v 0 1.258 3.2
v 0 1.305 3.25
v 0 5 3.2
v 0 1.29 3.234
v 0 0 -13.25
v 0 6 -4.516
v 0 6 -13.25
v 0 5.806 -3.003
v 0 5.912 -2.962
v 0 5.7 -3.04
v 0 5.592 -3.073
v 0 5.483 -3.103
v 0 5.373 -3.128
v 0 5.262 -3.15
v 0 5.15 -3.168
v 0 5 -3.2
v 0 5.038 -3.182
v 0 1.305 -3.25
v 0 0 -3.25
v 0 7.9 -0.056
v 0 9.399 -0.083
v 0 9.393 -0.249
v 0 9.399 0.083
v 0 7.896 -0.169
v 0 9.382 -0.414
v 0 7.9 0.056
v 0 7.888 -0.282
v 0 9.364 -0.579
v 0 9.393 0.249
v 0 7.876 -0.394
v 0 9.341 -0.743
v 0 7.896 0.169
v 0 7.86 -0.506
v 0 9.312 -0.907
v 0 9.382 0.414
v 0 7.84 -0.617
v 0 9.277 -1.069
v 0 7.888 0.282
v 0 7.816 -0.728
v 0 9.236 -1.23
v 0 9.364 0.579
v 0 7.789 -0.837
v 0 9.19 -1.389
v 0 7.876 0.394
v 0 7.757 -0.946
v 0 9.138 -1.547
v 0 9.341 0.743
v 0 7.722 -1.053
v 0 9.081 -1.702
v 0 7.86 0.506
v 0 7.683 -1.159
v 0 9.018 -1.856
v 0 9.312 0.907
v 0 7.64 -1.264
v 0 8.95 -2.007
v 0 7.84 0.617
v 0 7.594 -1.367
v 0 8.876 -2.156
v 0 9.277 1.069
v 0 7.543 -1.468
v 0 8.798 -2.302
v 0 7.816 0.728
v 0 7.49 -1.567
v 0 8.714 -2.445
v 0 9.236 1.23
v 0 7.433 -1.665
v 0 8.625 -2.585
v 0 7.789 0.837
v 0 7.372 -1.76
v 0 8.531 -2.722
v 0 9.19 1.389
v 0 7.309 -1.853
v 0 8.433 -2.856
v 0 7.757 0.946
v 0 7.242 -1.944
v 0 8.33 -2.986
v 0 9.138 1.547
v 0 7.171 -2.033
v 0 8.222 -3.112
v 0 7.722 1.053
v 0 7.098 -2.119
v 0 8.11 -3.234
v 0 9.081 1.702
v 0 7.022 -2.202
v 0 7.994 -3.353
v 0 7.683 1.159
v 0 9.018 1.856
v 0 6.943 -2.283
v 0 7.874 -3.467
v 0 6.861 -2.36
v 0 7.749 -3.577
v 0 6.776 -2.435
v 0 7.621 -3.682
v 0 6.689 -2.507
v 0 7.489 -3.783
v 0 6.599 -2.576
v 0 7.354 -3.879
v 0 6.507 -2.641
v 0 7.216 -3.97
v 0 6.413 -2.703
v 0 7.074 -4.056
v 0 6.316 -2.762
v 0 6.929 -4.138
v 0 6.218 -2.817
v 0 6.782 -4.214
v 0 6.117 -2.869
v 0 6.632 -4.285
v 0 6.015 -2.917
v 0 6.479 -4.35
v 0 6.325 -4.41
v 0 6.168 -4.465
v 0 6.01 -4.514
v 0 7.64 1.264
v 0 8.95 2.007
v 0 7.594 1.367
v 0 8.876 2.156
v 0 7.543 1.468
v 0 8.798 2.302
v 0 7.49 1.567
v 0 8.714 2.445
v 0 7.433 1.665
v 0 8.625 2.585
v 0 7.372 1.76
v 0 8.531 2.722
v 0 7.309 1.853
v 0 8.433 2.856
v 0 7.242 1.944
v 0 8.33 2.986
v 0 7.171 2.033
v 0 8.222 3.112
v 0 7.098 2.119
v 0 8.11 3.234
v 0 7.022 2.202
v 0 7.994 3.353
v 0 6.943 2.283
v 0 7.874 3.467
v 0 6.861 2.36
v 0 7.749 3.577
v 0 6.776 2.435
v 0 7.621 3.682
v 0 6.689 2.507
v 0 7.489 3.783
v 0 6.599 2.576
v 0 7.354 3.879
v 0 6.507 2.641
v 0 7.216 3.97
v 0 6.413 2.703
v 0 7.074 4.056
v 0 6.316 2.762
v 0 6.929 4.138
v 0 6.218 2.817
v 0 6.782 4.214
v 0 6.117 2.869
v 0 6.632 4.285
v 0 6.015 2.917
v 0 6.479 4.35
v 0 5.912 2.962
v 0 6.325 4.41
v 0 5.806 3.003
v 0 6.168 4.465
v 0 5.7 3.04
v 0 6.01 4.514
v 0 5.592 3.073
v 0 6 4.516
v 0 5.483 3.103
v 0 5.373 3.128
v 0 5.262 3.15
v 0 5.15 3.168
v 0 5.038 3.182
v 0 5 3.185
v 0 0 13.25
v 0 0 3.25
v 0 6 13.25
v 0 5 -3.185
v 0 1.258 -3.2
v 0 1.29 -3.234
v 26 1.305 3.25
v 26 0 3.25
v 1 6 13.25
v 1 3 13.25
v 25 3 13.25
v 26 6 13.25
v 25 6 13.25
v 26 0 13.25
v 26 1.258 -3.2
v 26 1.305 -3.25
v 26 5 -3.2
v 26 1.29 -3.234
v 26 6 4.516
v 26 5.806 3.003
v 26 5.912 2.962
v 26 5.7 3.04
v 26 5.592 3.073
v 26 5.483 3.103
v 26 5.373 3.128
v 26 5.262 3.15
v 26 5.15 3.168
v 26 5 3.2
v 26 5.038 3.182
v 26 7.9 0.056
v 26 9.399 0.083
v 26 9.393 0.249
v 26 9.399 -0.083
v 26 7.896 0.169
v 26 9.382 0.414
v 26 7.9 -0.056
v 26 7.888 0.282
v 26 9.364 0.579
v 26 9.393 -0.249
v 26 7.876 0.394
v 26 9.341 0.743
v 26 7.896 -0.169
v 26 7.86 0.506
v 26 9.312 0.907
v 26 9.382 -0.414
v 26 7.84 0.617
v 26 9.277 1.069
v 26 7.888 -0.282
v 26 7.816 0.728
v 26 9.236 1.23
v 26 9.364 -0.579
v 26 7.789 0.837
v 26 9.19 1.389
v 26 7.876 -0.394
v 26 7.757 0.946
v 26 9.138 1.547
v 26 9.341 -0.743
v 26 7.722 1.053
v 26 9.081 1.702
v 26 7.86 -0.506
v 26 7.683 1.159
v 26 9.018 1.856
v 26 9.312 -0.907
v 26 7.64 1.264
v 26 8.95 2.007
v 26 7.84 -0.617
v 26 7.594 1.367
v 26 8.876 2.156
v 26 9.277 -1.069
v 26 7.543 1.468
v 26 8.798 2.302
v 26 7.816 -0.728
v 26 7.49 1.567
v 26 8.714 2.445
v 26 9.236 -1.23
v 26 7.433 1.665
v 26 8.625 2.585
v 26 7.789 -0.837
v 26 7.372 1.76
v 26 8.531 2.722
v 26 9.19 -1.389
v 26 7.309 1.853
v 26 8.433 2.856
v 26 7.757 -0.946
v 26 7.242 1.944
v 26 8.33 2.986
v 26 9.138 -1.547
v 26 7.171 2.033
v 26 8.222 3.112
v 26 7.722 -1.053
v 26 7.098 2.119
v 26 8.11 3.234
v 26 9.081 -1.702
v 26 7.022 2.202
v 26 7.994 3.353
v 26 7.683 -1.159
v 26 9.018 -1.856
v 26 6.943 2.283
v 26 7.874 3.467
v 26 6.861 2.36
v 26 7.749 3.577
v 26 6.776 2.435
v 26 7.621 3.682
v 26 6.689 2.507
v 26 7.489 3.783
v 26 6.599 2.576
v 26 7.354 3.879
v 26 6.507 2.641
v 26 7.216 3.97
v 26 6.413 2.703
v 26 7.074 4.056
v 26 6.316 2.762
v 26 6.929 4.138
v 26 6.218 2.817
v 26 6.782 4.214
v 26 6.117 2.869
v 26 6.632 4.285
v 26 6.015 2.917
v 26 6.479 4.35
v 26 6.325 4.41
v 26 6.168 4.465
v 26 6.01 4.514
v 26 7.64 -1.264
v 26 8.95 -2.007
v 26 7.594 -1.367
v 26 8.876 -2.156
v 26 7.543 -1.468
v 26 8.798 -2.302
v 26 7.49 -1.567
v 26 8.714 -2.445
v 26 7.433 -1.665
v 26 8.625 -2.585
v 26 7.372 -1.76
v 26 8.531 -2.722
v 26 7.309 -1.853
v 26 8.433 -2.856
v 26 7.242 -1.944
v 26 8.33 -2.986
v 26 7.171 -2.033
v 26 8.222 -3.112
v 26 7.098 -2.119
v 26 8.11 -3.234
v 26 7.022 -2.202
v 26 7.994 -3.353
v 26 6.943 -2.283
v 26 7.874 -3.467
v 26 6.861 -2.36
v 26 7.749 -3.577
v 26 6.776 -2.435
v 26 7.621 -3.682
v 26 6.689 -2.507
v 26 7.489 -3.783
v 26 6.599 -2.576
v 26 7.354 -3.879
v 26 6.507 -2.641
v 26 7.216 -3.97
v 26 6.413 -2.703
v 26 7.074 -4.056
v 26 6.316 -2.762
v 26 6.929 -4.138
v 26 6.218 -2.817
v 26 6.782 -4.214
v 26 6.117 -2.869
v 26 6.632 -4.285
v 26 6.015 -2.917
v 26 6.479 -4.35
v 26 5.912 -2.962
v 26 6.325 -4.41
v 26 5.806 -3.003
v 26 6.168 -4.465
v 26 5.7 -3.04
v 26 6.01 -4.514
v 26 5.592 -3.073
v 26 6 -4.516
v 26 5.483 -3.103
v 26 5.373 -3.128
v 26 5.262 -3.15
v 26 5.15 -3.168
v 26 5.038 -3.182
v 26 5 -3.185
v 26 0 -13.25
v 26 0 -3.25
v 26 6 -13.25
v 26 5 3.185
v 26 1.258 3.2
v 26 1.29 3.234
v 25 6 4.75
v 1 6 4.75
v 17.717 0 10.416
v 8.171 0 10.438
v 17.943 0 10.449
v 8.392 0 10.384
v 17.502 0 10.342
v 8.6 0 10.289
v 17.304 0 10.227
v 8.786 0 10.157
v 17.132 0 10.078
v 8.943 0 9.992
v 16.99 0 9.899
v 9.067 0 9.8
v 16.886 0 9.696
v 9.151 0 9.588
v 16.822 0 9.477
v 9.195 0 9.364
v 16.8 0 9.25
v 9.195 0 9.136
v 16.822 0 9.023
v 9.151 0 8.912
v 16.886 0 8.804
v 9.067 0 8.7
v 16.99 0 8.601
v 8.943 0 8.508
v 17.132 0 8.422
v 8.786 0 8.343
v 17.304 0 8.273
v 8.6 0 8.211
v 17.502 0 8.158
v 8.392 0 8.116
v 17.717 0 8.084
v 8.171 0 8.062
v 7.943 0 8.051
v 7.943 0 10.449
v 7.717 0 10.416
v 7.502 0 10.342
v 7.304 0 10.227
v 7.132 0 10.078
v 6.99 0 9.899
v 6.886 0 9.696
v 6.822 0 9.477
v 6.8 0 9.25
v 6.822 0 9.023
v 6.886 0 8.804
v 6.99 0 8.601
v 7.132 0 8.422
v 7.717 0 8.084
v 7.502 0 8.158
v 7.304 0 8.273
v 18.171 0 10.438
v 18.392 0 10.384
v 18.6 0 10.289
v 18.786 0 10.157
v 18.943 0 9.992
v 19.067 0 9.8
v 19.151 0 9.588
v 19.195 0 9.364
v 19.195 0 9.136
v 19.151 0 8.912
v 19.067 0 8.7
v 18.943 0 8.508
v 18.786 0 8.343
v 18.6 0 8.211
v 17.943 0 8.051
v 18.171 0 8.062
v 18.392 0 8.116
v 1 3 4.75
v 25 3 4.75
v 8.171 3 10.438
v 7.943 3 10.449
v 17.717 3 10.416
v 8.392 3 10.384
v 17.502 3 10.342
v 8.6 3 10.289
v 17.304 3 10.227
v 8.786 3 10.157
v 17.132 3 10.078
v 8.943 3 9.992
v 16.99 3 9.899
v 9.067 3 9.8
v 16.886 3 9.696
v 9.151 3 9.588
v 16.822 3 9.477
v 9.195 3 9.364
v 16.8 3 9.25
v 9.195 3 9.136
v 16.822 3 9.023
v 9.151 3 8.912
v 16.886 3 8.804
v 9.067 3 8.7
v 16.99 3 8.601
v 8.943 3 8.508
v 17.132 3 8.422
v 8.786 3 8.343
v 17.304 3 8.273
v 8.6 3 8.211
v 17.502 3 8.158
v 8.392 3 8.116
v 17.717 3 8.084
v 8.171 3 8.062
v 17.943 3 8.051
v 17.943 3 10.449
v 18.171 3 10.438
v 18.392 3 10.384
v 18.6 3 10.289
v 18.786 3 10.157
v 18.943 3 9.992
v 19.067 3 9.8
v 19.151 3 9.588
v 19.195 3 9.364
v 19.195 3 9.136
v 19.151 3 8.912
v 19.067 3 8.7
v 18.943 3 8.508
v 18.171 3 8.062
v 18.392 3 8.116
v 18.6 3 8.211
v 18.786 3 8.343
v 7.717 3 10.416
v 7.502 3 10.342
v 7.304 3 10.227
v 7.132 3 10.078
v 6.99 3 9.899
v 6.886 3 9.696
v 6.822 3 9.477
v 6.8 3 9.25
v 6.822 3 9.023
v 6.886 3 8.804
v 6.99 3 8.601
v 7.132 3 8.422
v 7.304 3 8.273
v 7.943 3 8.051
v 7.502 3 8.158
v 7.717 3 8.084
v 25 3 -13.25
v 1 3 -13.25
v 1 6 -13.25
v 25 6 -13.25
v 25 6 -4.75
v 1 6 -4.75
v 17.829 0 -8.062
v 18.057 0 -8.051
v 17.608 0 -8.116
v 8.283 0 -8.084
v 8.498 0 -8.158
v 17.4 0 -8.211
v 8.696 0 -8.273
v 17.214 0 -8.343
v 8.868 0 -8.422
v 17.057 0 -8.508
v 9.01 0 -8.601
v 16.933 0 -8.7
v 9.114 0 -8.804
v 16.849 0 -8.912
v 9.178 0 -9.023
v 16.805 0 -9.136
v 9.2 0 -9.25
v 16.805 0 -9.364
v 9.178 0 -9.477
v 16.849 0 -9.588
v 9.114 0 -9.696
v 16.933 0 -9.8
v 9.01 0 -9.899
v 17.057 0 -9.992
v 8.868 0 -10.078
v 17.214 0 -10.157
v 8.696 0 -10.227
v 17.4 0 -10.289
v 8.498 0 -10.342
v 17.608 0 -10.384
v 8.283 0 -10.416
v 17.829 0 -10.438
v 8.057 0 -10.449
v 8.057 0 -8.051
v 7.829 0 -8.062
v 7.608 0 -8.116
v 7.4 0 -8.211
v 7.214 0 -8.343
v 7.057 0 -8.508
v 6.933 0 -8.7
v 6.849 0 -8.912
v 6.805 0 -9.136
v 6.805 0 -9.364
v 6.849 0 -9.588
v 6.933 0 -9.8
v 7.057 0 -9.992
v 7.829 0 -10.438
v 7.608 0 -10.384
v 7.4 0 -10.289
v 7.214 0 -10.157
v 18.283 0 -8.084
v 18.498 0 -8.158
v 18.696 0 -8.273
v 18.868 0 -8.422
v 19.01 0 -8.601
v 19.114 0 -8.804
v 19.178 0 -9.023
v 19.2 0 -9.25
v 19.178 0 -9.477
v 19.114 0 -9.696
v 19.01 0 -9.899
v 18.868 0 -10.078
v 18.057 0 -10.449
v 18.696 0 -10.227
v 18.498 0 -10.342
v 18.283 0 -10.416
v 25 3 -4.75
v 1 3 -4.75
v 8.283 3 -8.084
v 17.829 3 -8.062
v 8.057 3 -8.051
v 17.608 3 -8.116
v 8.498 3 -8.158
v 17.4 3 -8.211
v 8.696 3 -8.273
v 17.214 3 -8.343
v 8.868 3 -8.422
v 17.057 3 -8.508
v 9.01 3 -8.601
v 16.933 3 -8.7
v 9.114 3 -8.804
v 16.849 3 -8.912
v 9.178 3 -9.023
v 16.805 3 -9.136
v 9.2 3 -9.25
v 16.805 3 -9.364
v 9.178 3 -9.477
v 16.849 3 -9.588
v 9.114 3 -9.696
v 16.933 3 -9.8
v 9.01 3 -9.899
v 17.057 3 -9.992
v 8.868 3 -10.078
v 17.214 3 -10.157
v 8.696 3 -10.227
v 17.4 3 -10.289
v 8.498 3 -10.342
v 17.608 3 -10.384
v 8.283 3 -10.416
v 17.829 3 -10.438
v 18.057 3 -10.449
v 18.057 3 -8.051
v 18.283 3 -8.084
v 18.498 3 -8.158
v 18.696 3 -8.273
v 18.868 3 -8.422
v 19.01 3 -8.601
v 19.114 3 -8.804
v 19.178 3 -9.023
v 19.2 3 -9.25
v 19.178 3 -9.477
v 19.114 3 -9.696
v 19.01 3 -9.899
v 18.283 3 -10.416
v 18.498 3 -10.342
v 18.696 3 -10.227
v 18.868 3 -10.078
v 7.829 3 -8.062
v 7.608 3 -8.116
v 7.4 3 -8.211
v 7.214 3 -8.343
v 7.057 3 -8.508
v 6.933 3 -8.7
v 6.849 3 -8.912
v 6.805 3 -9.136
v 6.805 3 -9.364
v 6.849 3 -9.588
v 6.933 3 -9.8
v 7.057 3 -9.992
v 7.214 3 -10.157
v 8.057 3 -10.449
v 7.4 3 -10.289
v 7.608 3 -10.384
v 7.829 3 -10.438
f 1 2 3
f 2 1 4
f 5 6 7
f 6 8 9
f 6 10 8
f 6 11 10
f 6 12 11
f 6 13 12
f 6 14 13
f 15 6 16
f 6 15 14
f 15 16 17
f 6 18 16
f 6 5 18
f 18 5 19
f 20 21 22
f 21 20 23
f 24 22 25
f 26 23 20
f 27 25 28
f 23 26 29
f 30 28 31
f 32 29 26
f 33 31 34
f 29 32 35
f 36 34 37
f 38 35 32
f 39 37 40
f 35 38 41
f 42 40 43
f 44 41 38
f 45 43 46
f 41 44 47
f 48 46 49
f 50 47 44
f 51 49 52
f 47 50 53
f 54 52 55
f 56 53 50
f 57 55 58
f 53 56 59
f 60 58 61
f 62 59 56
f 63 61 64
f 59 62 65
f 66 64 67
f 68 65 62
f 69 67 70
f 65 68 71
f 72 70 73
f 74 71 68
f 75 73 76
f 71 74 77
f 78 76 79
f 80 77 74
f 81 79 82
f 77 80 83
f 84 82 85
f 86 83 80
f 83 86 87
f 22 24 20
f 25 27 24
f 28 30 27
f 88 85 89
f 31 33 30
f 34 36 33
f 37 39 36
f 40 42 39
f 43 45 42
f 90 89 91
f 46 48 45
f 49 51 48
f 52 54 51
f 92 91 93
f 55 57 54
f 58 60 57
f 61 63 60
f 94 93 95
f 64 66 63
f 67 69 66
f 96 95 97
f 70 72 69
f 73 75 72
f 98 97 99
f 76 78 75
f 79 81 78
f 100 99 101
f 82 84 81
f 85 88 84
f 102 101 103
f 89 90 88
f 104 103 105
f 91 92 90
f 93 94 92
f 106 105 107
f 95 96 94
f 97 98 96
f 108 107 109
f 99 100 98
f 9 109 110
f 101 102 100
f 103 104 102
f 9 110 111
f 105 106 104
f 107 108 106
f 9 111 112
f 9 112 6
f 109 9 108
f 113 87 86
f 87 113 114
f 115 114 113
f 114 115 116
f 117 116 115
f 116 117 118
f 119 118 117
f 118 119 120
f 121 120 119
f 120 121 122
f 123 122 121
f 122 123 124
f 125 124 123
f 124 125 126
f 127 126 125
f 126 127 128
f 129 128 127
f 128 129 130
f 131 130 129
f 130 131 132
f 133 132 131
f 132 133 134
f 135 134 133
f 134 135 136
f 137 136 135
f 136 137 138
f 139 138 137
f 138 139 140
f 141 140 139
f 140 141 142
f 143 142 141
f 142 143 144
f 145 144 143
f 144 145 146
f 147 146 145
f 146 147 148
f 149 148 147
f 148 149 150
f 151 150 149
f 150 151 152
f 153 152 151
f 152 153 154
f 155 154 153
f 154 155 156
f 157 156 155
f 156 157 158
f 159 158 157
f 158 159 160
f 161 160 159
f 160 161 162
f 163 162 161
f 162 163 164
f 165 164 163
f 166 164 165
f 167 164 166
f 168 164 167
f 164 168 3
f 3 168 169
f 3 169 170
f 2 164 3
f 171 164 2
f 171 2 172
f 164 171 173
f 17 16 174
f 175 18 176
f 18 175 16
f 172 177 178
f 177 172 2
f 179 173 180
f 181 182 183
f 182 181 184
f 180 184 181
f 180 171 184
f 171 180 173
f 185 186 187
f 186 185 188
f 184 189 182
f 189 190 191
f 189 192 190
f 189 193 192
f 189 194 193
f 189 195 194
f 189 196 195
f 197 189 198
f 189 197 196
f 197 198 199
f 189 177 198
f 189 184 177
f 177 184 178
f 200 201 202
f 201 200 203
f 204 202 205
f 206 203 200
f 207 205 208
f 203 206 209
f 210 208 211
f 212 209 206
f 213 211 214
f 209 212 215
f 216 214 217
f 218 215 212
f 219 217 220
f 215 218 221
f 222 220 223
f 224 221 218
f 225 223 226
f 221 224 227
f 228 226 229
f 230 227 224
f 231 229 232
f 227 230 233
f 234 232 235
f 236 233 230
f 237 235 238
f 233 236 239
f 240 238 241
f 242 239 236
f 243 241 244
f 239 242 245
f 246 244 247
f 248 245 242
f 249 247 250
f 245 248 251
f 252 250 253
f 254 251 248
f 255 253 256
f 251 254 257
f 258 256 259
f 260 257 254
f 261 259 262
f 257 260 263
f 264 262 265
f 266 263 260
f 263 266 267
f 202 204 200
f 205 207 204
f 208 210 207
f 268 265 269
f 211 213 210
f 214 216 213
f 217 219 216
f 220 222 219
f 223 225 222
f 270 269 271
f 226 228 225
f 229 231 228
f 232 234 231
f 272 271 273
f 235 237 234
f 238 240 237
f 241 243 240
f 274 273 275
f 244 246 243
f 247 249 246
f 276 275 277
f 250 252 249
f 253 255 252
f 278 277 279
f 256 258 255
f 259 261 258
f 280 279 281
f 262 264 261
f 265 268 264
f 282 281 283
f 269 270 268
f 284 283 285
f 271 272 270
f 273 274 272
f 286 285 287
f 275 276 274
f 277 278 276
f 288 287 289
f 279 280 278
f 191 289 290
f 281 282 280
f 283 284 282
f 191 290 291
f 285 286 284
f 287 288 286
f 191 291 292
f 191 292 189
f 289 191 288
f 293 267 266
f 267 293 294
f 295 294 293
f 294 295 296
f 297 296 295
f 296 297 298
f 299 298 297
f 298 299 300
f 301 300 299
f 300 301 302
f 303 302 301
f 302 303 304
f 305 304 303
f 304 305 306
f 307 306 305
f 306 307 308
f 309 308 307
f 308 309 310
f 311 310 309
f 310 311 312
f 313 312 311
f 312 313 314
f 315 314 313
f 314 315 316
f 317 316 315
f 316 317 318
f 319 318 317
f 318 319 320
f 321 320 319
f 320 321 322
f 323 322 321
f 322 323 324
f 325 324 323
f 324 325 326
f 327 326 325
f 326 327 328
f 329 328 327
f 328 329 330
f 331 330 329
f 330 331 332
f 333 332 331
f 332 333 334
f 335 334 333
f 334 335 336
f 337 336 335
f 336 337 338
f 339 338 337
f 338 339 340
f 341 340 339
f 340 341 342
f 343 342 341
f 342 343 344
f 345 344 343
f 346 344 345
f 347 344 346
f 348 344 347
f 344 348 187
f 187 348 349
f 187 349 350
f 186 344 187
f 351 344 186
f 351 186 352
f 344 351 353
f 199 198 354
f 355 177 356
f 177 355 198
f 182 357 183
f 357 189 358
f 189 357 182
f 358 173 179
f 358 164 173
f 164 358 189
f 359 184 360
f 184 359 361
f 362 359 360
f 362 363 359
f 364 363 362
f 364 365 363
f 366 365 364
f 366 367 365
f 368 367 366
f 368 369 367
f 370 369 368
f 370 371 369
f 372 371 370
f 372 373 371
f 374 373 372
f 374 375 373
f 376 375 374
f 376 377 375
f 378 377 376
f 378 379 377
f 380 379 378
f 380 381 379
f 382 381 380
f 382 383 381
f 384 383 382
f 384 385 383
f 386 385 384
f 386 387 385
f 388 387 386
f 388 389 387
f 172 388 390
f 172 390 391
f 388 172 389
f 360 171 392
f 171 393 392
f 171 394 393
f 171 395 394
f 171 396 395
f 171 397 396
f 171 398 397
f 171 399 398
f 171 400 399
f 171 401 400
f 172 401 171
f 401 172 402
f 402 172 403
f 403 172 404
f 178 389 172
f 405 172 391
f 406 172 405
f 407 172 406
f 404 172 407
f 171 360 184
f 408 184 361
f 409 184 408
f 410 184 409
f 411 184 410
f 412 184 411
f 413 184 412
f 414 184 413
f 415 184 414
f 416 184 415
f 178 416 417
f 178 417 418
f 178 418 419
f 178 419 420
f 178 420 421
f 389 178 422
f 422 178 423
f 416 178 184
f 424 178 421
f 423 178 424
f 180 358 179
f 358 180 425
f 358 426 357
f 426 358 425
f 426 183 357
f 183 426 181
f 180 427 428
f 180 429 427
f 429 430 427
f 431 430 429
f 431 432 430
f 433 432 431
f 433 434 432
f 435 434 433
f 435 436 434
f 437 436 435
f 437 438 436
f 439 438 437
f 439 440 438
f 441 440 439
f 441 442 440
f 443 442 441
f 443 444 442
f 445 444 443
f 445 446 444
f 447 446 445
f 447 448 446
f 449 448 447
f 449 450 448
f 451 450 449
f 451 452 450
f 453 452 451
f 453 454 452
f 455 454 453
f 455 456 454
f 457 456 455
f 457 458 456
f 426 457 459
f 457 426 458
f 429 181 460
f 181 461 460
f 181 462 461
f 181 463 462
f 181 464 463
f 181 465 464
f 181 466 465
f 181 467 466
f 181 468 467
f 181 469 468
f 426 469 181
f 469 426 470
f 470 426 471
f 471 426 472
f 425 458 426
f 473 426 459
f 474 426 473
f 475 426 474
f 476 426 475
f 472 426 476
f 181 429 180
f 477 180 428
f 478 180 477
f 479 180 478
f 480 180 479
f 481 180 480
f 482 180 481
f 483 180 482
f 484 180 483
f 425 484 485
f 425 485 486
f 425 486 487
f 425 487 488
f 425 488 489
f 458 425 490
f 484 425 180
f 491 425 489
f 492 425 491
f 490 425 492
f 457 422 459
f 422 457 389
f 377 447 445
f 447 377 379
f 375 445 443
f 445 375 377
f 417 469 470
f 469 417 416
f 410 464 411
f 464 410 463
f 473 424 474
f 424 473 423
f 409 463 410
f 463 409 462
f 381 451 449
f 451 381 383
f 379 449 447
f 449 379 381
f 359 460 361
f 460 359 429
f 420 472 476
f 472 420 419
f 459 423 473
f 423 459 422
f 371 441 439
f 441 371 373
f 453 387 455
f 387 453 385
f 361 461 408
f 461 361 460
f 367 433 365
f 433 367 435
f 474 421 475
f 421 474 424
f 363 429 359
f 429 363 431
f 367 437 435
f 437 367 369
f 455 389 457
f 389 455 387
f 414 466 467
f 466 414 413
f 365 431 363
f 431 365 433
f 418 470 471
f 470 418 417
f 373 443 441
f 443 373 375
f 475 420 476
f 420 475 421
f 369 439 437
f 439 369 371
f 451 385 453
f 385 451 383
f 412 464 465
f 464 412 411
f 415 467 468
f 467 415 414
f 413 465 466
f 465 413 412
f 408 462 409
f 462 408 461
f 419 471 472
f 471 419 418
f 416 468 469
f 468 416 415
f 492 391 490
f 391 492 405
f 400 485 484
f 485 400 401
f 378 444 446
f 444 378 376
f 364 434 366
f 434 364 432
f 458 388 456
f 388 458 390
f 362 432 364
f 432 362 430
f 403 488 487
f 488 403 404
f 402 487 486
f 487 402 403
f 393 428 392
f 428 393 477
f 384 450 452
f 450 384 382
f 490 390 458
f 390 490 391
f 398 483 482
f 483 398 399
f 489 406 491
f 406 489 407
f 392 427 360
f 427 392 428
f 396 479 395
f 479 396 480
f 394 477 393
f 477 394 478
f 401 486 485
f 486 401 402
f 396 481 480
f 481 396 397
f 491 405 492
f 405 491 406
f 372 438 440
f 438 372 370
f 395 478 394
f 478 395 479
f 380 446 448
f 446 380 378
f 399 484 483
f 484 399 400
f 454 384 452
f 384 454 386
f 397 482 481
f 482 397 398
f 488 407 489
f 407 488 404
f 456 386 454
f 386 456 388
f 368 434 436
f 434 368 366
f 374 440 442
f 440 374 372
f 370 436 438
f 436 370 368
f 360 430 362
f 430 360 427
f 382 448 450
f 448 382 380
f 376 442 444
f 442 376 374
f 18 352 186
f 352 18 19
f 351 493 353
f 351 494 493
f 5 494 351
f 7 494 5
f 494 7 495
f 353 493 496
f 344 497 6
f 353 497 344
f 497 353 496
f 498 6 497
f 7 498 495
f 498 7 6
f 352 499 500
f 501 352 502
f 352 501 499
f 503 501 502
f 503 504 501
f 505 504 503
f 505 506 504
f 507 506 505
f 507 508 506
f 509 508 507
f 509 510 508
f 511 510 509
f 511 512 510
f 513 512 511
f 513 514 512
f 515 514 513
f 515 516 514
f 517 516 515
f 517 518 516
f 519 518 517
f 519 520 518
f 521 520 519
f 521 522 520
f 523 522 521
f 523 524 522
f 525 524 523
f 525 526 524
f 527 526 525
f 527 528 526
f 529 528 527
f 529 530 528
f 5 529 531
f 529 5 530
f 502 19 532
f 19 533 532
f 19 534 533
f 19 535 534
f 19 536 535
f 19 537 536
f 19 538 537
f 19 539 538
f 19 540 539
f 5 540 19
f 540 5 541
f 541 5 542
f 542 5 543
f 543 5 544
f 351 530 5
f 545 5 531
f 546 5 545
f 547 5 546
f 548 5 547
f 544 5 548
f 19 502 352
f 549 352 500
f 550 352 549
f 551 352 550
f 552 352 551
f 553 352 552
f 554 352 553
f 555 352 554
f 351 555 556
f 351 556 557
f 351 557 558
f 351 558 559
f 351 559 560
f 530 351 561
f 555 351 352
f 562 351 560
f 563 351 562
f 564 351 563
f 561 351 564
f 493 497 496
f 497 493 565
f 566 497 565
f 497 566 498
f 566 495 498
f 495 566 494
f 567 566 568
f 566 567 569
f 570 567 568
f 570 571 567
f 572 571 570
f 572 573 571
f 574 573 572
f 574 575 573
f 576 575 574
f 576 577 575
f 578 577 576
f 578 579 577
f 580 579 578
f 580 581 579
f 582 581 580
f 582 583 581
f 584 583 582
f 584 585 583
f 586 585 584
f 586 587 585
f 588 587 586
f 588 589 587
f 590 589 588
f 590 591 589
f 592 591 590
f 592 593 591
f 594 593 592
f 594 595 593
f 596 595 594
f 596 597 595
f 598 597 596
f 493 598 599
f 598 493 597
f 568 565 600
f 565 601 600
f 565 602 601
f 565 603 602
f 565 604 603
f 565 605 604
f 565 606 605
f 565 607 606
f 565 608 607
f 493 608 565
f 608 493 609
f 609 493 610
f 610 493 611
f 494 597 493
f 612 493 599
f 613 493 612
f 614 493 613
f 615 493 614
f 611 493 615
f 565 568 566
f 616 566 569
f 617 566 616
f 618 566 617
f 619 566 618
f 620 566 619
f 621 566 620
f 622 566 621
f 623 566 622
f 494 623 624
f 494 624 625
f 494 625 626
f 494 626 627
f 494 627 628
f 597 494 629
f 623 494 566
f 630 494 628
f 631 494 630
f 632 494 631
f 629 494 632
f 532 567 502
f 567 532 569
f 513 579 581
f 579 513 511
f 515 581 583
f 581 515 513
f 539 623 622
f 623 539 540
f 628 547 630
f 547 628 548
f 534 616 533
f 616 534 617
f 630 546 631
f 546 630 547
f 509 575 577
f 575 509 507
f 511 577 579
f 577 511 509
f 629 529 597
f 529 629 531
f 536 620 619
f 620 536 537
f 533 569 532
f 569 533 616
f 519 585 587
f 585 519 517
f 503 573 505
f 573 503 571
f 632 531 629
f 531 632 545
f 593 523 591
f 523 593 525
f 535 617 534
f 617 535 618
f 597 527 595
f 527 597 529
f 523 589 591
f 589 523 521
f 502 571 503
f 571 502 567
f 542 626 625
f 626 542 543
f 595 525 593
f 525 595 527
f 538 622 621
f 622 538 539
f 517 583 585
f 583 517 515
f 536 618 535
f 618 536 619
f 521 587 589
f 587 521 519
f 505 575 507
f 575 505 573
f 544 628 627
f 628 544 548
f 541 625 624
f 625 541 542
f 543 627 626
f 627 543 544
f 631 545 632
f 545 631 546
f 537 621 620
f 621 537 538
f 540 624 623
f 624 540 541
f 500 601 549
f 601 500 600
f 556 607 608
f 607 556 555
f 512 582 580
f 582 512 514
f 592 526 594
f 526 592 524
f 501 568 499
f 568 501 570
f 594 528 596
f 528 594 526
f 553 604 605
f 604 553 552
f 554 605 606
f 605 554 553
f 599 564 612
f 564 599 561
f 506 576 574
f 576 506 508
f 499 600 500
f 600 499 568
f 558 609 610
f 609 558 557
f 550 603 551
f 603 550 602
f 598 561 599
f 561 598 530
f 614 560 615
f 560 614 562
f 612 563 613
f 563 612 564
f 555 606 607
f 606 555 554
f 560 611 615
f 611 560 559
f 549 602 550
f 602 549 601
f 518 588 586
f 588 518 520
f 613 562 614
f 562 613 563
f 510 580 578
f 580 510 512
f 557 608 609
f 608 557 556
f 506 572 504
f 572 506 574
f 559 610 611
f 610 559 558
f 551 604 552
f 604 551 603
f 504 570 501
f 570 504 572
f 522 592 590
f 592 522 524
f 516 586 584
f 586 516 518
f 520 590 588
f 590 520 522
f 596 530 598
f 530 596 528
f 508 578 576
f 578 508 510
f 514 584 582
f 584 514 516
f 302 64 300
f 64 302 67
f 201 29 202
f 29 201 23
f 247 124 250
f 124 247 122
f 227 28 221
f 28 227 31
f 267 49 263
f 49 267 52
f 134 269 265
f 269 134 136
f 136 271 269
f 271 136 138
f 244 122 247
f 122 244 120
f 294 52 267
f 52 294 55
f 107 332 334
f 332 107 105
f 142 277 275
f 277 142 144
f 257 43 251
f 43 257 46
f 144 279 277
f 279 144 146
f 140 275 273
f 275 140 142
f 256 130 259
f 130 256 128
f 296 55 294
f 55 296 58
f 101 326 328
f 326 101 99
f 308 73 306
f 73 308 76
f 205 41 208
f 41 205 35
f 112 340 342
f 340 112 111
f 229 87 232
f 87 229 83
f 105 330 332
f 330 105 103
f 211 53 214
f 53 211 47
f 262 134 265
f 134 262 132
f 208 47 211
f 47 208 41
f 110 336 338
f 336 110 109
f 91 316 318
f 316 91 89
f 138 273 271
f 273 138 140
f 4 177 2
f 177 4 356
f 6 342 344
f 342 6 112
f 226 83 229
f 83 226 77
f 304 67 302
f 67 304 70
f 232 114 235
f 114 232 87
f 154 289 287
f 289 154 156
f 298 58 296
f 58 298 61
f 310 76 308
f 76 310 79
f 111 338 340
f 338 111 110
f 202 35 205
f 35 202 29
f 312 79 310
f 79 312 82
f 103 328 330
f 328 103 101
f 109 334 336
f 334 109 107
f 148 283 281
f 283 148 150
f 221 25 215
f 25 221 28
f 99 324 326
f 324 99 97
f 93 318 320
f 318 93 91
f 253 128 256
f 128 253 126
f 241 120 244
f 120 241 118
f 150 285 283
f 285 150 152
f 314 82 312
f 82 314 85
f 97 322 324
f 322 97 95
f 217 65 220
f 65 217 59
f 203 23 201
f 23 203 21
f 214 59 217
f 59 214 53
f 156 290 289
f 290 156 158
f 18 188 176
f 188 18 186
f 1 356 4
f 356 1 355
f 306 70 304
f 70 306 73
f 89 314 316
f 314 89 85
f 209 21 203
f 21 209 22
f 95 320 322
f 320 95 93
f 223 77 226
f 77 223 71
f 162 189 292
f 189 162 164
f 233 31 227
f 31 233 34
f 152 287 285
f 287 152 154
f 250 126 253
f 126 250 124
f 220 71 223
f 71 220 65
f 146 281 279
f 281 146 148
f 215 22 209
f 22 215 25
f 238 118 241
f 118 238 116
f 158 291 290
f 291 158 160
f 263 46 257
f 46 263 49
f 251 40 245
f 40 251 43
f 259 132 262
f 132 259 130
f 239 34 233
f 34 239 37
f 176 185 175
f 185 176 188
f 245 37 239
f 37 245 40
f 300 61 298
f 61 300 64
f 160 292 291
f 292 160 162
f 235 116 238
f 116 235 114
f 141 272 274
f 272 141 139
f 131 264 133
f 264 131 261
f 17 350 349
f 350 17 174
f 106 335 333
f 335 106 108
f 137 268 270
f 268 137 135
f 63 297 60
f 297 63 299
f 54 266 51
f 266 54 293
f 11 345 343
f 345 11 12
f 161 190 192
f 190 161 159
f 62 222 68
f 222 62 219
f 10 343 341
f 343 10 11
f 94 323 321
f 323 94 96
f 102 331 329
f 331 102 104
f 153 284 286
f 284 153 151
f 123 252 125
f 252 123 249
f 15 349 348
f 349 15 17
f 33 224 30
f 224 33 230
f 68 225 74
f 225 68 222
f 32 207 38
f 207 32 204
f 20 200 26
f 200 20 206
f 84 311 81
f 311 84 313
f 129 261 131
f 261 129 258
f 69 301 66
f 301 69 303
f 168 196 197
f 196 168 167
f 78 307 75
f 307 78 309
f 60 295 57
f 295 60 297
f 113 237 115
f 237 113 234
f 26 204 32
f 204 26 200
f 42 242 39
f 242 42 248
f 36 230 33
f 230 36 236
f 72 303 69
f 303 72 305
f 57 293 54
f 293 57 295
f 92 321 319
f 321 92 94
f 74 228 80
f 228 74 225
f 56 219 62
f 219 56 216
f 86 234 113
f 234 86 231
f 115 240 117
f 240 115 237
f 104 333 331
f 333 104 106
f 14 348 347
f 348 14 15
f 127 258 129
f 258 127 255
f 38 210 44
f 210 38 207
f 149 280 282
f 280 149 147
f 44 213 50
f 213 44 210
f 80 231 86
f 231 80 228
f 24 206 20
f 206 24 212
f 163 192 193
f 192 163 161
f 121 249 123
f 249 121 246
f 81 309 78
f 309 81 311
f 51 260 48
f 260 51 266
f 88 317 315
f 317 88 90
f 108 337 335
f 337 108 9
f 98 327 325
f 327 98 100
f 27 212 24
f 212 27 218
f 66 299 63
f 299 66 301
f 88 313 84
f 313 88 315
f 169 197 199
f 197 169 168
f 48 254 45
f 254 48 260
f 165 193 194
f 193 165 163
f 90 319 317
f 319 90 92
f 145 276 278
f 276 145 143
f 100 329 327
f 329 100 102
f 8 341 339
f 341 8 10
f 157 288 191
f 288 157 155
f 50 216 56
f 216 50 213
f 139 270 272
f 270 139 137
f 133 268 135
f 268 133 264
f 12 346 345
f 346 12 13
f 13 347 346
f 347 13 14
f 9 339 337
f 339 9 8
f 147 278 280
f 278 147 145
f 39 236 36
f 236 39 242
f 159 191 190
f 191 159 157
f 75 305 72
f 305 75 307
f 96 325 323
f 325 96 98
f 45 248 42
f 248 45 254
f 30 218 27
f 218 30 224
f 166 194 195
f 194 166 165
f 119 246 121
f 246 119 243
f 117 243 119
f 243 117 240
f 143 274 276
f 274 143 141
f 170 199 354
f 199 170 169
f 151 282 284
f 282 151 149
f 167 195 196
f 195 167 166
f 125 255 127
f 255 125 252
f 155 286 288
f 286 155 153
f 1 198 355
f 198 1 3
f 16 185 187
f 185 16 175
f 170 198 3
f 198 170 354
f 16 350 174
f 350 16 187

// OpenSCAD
// file: ../Parts/rounder.scad
// rounder.scad
// cutting tool for rounding off corners with a cylinder

//---------------------
module rounder(
r=10,   // radius
h=10,   // height
f=22,    // $fn
extra=0.01  // extra size for the cube
){

difference(){
  translate([-extra,-extra,-extra])
  cube([r+extra,r+extra,h+2*extra]);
  translate([r,r,-1])
  cylinder(r=r,h=h+2,$fn=f);
}

}

//---------------------------------------------------------------------------
module bevel(x=1,y=1,h=10){

linear_extrude(height=h)
polygon(points=[[0,0],[x,0],[0,y]]);
    
}
  

//========================

rounder();

//========================
// main file
//======================================================================
// Mister.scad
//
// Hanger for 1/8" OD line with mister nozzles.
//
// DrTomFlint 26 Aug 2024
//
//======================================================================

use <../Parts/rounder.scad>



//----------------------------------------------------------------------
module hang1(){
//~ wide=26;
wide=36;
thick=1.5;
gap=8;

// staple attachment
difference(){
  translate([0,0,-0.5])
  difference(){
    translate([-(26-wide)/2,0,gap])
    cube([26,7*thick,10]);
    translate([-(24-wide)/2,4*thick,gap+thick+0.01])
    cube([24,7*thick,10-thick]);
    translate([(wide-10)/2,3*thick,gap+4])
    rotate([90,0,0])
    cylinder(r=1.2,h=10,center=true,$fn=33);
    translate([(wide-10)/2+10,3*thick,gap+4])
    rotate([90,0,0])
    cylinder(r=1.2,h=10,center=true,$fn=33);
  }
  translate([-2,-4*thick,gap-2])
  cube([34,4*thick,15]);
}

translate([wide,0,0])
rotate([0,180,0])
difference(){
  translate([0,0,-0.5])
  difference(){
    translate([-(26-wide)/2,0,gap])
    cube([26,7*thick,10]);
    translate([-(24-wide)/2,4*thick,gap+thick+0.01])
    cube([24,7*thick,10-thick]);
    translate([(wide-10)/2,3*thick,gap+4])
    rotate([90,0,0])
    cylinder(r=1.2,h=10,center=true,$fn=33);
    translate([(wide-10)/2+10,3*thick,gap+4])
    rotate([90,0,0])
    cylinder(r=1.2,h=10,center=true,$fn=33);
  }
  translate([-2,-4*thick,gap-2])
  cube([34,4*thick,15]);
}

// fiber clip
difference(){
  translate([0,thick+7.5,0])
  rotate([0,90,0])
  cylinder(r=7.5+thick,h=wide,$fn=33);
  translate([-1,thick+7.5,0])
  rotate([0,90,0])
  cylinder(r=7.5,h=wide+2,$fn=33);

  translate([0,0,-7.5])
  cube([wide,7.5,15]);

  hull(){
    translate([wide/2,20,-7.5])
    rotate([45,0,0])
    cylinder(r=7,h=10,$fn=33);
    translate([wide/2,13,0])
    rotate([-45,0,0])
    cylinder(r=7,h=10,$fn=33);
  }
}

  translate([0,0,7.5])
  cube([5,7.5,thick]);
  translate([0,0,-7.5-thick])
  cube([5,7.5,thick]);

  translate([31,0,7.5])
  cube([5,7.5,thick]);
  translate([31,0,-7.5-thick])
  cube([5,7.5,thick]);



}

//----------------------------------------------------------------------
module hang2(){
//~ wide=26;
wide=36;
thick=1.5;
gap=8;

difference(){
  union(){
    // staple attachment
    translate([wide,0,25.5])
    rotate([0,180,0])
    difference(){
      translate([-(26-wide)/2,0,gap])
      cube([26,4*thick,10]);
      translate([-(24-wide)/2,2*thick,gap])
      cube([24,7*thick,10-thick]);
      translate([(wide-10)/2,3*thick,gap+4])
      rotate([90,0,0])
      cylinder(r=1.2,h=10,center=true,$fn=33);
      translate([(wide-10)/2+10,3*thick,gap+4])
      rotate([90,0,0])
      cylinder(r=1.2,h=10,center=true,$fn=33);
    }

    translate([0,0,-25.5])
    rotate([0,0,0])
    difference(){
      translate([-(26-wide)/2,0,gap])
      cube([26,4*thick,10]);
      translate([-(24-wide)/2,2*thick,gap])
      cube([24,7*thick,10-thick]);
      translate([(wide-10)/2,3*thick,gap+4])
      rotate([90,0,0])
      cylinder(r=1.2,h=10,center=true,$fn=33);
      translate([(wide-10)/2+10,3*thick,gap+4])
      rotate([90,0,0])
      cylinder(r=1.2,h=10,center=true,$fn=33);
    }

    // fiber clip
    difference(){
      translate([0,thick+7.5,0])
      rotate([0,90,0])
      cylinder(r=7.5+thick,h=wide,$fn=178);
      
      translate([-1,thick+7.5,0])
      rotate([0,90,0])
      cylinder(r=7.5-0.2,h=wide+2,$fn=17);

      translate([0,0,-7.5])
      cube([wide,7.0,15]);
    }

    // add end walls to make it printable
    translate([0,0,7.5])
    cube([5,7.0,thick]);
    translate([0,0,-7.5-thick])
    cube([5,7.0,thick]);

    translate([31,0,7.5])
    cube([5,7.0,thick]);
    translate([31,0,-7.5-thick])
    cube([5,7.0,thick]);
  
  } // end of union

  hull(){
    translate([wide/2,10,-5])
    rotate([40,0,0])
    cylinder(r=4.4,h=15,$fn=99,center=true);

    translate([wide/2,15,0])
    rotate([90,0,0])
    cylinder(r=4.4,h=15,$fn=99,center=true);
    
    translate([wide/2,10,5])
    rotate([-40,0,0])
    cylinder(r=4.4,h=15,$fn=99,center=true);
  }

} // end diff


}


//----------------------------------------------------------------------
module hang3(){
wide=26;
//~ wide=36;
thick=1.5;
gap=12.25;

    // staple attachment
    translate([wide,0,25.5])
    rotate([0,180,0])
    difference(){
      translate([-(26-wide)/2,0,gap])
      cube([26,4*thick,10]);
      translate([-(24-wide)/2,2*thick,gap])
      cube([24,7*thick,10-thick]);
      translate([(wide-10)/2,3*thick,gap+4])
      rotate([90,0,0])
      cylinder(r=1.2,h=10,center=true,$fn=33);
      translate([(wide-10)/2+10,3*thick,gap+4])
      rotate([90,0,0])
      cylinder(r=1.2,h=10,center=true,$fn=33);
    }

    translate([0,0,-25.5])
    rotate([0,0,0])
    difference(){
      translate([-(26-wide)/2,0,gap])
      cube([26,4*thick,10]);
      translate([-(24-wide)/2,2*thick,gap])
      cube([24,7*thick,10-thick]);
      translate([(wide-10)/2,3*thick,gap+4])
      rotate([90,0,0])
      cylinder(r=1.2,h=10,center=true,$fn=33);
      translate([(wide-10)/2+10,3*thick,gap+4])
      rotate([90,0,0])
      cylinder(r=1.2,h=10,center=true,$fn=33);
    }

    // fiber clip
    difference(){
      translate([0,thick+3.2,0])
      rotate([0,90,0])
      cylinder(r=3.2+thick,h=wide,$fn=178);
      
      translate([-1,thick+3.2,0])
      rotate([0,90,0])
      cylinder(r=3.2,h=wide+2,$fn=178);

      translate([0,0,-3.2])
      cube([wide,5,6.4]);
    }

    // add end walls to make it printable
    //~ translate([0,0,3.2])
    //~ cube([5,6.0,thick]);
    //~ translate([0,0,-3.2-thick])
    //~ cube([5,6.0,thick]);

    //~ translate([31,0,3.2])
    //~ cube([5,6.0,thick]);
    //~ translate([31,0,-3.2-thick])
    //~ cube([5,6.0,thick]);
  

}



//======================================================================

//~ translate([0,100,0])
//~ hang1();


//~ hang2();

hang3();


//======================================================================
